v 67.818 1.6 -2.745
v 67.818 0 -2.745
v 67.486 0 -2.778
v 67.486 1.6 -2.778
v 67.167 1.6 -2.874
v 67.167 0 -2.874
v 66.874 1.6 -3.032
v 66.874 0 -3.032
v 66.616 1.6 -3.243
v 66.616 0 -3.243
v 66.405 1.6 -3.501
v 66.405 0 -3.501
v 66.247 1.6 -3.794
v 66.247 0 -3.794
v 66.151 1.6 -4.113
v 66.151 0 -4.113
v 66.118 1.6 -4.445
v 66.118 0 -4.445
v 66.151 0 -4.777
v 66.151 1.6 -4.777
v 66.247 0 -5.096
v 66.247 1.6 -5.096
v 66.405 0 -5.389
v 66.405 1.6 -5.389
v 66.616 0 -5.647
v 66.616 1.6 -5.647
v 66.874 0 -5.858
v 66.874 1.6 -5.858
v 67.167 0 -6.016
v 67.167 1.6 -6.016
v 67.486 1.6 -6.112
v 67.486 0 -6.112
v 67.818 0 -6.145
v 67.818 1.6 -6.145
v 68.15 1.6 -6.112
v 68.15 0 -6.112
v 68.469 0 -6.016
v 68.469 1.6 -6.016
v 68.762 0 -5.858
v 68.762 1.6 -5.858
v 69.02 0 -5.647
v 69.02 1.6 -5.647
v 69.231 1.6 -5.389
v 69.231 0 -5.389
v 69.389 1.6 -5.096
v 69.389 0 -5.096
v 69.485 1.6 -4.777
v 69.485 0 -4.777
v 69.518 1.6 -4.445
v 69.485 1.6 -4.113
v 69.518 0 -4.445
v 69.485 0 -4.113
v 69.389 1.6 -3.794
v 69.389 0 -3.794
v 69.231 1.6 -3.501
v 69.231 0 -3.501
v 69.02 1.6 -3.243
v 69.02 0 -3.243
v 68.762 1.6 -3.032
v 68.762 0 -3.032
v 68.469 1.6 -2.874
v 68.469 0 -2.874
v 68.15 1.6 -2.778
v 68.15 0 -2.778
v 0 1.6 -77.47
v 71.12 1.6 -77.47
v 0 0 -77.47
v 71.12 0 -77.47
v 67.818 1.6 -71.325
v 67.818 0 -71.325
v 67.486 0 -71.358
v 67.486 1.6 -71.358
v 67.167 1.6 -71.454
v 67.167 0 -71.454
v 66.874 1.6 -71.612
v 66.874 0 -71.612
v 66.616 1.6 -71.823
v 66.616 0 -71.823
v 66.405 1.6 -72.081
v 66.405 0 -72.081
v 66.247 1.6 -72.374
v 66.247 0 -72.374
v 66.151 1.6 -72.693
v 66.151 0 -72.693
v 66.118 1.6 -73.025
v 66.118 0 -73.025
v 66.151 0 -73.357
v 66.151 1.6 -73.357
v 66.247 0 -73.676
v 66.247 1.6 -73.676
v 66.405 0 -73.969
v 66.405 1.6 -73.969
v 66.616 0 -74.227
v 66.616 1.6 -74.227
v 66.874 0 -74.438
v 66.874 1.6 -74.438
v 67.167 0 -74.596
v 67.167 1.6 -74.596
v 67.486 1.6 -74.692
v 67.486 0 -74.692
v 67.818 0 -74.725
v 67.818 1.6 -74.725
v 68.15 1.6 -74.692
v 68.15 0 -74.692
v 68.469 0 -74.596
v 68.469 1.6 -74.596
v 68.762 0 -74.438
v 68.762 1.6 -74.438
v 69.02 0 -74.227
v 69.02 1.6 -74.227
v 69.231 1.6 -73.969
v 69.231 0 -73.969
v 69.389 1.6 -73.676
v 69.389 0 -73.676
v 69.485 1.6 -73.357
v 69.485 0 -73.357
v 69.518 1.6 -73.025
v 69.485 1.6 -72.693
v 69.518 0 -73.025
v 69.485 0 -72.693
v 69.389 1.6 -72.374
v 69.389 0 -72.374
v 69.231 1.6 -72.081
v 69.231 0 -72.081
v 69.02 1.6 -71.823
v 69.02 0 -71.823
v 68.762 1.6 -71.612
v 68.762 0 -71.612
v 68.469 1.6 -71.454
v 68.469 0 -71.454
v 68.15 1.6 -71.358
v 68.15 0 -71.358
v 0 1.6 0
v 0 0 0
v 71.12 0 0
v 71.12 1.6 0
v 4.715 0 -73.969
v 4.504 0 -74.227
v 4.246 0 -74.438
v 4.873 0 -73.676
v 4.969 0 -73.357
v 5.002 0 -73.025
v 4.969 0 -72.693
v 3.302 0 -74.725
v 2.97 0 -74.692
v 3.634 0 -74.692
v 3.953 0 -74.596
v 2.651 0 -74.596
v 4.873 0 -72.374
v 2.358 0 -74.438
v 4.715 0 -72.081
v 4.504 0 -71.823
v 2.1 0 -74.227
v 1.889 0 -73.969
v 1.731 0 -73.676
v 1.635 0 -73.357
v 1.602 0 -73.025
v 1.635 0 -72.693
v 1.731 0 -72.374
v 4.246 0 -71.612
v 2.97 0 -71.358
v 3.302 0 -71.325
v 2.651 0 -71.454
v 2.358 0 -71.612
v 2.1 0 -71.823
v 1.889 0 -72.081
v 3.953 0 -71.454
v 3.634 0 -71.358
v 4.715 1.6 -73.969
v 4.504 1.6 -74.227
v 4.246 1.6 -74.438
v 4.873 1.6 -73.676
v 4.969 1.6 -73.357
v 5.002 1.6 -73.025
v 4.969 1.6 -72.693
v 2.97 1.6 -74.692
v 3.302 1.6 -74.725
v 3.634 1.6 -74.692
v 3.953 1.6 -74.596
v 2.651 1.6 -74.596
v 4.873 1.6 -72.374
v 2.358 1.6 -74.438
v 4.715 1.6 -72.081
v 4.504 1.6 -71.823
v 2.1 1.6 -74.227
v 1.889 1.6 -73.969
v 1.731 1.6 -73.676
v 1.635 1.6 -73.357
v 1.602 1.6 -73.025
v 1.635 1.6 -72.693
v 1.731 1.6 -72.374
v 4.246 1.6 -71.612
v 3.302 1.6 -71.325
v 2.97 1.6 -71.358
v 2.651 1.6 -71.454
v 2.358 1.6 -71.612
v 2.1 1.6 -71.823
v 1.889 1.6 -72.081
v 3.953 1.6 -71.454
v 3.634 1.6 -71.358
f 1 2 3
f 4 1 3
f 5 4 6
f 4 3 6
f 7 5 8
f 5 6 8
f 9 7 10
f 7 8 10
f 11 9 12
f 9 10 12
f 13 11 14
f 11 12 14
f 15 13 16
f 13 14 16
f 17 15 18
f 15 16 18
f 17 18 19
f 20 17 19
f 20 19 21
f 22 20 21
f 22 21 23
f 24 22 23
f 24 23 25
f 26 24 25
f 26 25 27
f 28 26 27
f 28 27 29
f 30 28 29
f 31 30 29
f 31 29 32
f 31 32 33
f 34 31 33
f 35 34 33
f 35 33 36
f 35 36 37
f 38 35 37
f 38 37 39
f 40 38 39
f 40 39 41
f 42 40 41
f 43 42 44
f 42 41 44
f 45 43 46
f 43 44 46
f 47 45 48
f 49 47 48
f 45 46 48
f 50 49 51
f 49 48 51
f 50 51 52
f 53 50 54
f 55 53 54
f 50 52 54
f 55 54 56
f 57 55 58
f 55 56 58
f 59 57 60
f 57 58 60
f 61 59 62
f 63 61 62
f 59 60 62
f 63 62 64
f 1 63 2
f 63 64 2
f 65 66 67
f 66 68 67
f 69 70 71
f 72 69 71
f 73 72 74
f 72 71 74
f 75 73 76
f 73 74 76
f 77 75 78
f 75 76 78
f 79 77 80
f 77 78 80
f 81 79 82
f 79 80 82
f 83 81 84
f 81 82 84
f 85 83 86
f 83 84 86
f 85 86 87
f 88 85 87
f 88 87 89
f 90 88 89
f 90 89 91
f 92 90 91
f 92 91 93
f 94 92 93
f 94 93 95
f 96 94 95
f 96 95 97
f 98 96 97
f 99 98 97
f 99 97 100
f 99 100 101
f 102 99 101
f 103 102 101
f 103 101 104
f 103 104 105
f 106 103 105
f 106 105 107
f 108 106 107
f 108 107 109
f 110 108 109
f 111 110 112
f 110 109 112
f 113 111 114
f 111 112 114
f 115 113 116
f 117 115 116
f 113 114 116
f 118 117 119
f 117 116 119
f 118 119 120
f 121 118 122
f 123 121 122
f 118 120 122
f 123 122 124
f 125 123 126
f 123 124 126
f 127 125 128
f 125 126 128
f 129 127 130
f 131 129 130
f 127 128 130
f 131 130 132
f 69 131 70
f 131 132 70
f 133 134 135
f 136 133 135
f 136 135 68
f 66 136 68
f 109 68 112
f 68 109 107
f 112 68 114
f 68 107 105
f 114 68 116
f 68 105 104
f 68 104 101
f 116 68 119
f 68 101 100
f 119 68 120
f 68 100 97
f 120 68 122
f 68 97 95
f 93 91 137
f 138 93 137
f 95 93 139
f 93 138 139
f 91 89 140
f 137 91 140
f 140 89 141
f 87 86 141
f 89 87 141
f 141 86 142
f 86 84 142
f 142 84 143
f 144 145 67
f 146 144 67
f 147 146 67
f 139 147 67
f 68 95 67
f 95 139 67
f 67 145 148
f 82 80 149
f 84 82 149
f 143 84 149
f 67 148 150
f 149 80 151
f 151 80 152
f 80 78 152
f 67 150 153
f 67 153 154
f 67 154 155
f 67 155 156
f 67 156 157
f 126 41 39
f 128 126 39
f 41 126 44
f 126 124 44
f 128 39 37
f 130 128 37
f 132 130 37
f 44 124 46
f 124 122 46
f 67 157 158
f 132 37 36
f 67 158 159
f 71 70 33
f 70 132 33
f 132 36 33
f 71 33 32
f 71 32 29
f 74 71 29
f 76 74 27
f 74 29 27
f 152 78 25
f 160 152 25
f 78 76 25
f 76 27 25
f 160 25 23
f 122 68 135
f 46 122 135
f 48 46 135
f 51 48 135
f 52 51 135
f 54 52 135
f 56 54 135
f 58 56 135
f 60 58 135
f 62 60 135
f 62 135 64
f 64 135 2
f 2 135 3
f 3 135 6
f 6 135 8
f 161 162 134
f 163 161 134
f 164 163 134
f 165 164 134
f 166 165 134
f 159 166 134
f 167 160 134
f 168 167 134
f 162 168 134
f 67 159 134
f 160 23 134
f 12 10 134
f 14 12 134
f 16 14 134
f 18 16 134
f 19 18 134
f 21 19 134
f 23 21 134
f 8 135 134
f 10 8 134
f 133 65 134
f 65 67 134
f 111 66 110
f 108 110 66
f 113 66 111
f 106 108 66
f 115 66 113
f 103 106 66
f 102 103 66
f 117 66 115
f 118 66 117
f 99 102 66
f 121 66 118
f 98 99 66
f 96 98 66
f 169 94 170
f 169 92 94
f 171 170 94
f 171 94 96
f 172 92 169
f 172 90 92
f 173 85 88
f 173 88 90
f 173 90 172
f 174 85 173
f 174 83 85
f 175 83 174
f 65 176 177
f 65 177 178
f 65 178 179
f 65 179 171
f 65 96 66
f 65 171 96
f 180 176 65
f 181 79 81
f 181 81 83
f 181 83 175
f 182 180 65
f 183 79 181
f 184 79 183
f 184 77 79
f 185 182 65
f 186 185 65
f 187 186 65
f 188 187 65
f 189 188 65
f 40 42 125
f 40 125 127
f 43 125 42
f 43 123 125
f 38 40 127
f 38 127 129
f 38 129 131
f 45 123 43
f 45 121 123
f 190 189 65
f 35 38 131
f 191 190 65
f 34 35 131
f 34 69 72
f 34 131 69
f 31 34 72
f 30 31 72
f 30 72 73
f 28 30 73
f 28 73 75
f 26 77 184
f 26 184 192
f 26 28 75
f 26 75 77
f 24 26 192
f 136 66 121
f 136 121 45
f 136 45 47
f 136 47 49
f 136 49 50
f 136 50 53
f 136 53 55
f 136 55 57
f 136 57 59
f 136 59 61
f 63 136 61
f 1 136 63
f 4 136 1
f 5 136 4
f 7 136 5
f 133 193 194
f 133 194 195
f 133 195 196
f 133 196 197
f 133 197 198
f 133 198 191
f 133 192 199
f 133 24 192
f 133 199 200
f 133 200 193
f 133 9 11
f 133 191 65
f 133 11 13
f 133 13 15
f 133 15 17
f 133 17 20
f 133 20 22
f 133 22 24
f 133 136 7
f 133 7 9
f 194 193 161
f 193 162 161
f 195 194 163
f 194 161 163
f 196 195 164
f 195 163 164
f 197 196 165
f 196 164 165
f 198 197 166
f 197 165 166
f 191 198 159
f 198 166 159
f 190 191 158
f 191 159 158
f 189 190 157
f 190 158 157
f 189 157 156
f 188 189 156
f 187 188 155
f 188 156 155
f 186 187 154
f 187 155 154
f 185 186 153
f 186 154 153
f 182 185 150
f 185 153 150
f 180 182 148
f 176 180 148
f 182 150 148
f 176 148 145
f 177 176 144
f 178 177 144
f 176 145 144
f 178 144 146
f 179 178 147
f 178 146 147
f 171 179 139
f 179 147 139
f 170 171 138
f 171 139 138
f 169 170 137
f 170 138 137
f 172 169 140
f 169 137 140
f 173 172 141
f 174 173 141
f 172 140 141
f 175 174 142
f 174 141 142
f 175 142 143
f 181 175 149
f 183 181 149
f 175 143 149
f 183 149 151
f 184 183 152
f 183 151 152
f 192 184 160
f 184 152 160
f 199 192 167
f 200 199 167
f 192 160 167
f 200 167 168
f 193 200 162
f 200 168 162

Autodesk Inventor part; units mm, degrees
ref_plane "YZ Plane" through (0, 0, 0) normal (1, 0, 0) x (0, 1, 0)
sketch "Sketch1" plane through (0, 0, 0) normal (0, 1, 0) x (-1, 0, 0)
  line L0 (0, 0) -> (-71.12, 0)
  line L1 (-71.12, 0) -> (-71.12, -77.47)
  line L2 (-71.12, -77.47) -> (0, -77.47)
  line L3 (0, -77.47) -> (0, 0)
  dimension "d0" = 71.12
  dimension "d1" = 77.47
extrude "Extrusion1" add sketch "Sketch1" along normal blind 1.6
sketch "Sketch2" plane through (0, 1.6, 0) normal (0, 1, 0) x (1, 0, 0)
  line L0 (67.818, 4.445) -> (3.302, 4.445) construction
  line L1 (3.302, 4.445) -> (3.302, 73.025) construction
  line L2 (3.302, 73.025) -> (67.818, 73.025) construction
  line L3 (67.818, 73.025) -> (67.818, 4.445) construction
  line L4 (0, 0) -> (71.12, 0) construction
  line L5 (35.56, 0) -> (35.56, 77.47) construction
  line L6 (71.12, 77.47) -> (0, 77.47) construction
  line L7 (67.818, 73.025) -> (3.302, 4.445) construction
  point P0 (35.56, 38.735)
  dimension "d4" = 68.58
  dimension "d5" = 64.516
hole "Hole1" at (3.302, 1.6, -73.025) at (67.818, 1.6, -4.445) at (67.818, 1.6, -73.025) direction (0, -1, 0) diameter 3.4 end through all clearance for "Flat Head Machine Screw" size "M3" standard "Ansi Metric M Profile"
ref_plane "Work Plane1" through (0, 0, -38.735) normal (0, 0, 1) x (1, 0, 0)
ref_plane "Work Plane2" through (35.56, 0, -77.47) normal (-1, 0, 0) x (0, 0, 1)
properties part number "PCB" material "Copper"
